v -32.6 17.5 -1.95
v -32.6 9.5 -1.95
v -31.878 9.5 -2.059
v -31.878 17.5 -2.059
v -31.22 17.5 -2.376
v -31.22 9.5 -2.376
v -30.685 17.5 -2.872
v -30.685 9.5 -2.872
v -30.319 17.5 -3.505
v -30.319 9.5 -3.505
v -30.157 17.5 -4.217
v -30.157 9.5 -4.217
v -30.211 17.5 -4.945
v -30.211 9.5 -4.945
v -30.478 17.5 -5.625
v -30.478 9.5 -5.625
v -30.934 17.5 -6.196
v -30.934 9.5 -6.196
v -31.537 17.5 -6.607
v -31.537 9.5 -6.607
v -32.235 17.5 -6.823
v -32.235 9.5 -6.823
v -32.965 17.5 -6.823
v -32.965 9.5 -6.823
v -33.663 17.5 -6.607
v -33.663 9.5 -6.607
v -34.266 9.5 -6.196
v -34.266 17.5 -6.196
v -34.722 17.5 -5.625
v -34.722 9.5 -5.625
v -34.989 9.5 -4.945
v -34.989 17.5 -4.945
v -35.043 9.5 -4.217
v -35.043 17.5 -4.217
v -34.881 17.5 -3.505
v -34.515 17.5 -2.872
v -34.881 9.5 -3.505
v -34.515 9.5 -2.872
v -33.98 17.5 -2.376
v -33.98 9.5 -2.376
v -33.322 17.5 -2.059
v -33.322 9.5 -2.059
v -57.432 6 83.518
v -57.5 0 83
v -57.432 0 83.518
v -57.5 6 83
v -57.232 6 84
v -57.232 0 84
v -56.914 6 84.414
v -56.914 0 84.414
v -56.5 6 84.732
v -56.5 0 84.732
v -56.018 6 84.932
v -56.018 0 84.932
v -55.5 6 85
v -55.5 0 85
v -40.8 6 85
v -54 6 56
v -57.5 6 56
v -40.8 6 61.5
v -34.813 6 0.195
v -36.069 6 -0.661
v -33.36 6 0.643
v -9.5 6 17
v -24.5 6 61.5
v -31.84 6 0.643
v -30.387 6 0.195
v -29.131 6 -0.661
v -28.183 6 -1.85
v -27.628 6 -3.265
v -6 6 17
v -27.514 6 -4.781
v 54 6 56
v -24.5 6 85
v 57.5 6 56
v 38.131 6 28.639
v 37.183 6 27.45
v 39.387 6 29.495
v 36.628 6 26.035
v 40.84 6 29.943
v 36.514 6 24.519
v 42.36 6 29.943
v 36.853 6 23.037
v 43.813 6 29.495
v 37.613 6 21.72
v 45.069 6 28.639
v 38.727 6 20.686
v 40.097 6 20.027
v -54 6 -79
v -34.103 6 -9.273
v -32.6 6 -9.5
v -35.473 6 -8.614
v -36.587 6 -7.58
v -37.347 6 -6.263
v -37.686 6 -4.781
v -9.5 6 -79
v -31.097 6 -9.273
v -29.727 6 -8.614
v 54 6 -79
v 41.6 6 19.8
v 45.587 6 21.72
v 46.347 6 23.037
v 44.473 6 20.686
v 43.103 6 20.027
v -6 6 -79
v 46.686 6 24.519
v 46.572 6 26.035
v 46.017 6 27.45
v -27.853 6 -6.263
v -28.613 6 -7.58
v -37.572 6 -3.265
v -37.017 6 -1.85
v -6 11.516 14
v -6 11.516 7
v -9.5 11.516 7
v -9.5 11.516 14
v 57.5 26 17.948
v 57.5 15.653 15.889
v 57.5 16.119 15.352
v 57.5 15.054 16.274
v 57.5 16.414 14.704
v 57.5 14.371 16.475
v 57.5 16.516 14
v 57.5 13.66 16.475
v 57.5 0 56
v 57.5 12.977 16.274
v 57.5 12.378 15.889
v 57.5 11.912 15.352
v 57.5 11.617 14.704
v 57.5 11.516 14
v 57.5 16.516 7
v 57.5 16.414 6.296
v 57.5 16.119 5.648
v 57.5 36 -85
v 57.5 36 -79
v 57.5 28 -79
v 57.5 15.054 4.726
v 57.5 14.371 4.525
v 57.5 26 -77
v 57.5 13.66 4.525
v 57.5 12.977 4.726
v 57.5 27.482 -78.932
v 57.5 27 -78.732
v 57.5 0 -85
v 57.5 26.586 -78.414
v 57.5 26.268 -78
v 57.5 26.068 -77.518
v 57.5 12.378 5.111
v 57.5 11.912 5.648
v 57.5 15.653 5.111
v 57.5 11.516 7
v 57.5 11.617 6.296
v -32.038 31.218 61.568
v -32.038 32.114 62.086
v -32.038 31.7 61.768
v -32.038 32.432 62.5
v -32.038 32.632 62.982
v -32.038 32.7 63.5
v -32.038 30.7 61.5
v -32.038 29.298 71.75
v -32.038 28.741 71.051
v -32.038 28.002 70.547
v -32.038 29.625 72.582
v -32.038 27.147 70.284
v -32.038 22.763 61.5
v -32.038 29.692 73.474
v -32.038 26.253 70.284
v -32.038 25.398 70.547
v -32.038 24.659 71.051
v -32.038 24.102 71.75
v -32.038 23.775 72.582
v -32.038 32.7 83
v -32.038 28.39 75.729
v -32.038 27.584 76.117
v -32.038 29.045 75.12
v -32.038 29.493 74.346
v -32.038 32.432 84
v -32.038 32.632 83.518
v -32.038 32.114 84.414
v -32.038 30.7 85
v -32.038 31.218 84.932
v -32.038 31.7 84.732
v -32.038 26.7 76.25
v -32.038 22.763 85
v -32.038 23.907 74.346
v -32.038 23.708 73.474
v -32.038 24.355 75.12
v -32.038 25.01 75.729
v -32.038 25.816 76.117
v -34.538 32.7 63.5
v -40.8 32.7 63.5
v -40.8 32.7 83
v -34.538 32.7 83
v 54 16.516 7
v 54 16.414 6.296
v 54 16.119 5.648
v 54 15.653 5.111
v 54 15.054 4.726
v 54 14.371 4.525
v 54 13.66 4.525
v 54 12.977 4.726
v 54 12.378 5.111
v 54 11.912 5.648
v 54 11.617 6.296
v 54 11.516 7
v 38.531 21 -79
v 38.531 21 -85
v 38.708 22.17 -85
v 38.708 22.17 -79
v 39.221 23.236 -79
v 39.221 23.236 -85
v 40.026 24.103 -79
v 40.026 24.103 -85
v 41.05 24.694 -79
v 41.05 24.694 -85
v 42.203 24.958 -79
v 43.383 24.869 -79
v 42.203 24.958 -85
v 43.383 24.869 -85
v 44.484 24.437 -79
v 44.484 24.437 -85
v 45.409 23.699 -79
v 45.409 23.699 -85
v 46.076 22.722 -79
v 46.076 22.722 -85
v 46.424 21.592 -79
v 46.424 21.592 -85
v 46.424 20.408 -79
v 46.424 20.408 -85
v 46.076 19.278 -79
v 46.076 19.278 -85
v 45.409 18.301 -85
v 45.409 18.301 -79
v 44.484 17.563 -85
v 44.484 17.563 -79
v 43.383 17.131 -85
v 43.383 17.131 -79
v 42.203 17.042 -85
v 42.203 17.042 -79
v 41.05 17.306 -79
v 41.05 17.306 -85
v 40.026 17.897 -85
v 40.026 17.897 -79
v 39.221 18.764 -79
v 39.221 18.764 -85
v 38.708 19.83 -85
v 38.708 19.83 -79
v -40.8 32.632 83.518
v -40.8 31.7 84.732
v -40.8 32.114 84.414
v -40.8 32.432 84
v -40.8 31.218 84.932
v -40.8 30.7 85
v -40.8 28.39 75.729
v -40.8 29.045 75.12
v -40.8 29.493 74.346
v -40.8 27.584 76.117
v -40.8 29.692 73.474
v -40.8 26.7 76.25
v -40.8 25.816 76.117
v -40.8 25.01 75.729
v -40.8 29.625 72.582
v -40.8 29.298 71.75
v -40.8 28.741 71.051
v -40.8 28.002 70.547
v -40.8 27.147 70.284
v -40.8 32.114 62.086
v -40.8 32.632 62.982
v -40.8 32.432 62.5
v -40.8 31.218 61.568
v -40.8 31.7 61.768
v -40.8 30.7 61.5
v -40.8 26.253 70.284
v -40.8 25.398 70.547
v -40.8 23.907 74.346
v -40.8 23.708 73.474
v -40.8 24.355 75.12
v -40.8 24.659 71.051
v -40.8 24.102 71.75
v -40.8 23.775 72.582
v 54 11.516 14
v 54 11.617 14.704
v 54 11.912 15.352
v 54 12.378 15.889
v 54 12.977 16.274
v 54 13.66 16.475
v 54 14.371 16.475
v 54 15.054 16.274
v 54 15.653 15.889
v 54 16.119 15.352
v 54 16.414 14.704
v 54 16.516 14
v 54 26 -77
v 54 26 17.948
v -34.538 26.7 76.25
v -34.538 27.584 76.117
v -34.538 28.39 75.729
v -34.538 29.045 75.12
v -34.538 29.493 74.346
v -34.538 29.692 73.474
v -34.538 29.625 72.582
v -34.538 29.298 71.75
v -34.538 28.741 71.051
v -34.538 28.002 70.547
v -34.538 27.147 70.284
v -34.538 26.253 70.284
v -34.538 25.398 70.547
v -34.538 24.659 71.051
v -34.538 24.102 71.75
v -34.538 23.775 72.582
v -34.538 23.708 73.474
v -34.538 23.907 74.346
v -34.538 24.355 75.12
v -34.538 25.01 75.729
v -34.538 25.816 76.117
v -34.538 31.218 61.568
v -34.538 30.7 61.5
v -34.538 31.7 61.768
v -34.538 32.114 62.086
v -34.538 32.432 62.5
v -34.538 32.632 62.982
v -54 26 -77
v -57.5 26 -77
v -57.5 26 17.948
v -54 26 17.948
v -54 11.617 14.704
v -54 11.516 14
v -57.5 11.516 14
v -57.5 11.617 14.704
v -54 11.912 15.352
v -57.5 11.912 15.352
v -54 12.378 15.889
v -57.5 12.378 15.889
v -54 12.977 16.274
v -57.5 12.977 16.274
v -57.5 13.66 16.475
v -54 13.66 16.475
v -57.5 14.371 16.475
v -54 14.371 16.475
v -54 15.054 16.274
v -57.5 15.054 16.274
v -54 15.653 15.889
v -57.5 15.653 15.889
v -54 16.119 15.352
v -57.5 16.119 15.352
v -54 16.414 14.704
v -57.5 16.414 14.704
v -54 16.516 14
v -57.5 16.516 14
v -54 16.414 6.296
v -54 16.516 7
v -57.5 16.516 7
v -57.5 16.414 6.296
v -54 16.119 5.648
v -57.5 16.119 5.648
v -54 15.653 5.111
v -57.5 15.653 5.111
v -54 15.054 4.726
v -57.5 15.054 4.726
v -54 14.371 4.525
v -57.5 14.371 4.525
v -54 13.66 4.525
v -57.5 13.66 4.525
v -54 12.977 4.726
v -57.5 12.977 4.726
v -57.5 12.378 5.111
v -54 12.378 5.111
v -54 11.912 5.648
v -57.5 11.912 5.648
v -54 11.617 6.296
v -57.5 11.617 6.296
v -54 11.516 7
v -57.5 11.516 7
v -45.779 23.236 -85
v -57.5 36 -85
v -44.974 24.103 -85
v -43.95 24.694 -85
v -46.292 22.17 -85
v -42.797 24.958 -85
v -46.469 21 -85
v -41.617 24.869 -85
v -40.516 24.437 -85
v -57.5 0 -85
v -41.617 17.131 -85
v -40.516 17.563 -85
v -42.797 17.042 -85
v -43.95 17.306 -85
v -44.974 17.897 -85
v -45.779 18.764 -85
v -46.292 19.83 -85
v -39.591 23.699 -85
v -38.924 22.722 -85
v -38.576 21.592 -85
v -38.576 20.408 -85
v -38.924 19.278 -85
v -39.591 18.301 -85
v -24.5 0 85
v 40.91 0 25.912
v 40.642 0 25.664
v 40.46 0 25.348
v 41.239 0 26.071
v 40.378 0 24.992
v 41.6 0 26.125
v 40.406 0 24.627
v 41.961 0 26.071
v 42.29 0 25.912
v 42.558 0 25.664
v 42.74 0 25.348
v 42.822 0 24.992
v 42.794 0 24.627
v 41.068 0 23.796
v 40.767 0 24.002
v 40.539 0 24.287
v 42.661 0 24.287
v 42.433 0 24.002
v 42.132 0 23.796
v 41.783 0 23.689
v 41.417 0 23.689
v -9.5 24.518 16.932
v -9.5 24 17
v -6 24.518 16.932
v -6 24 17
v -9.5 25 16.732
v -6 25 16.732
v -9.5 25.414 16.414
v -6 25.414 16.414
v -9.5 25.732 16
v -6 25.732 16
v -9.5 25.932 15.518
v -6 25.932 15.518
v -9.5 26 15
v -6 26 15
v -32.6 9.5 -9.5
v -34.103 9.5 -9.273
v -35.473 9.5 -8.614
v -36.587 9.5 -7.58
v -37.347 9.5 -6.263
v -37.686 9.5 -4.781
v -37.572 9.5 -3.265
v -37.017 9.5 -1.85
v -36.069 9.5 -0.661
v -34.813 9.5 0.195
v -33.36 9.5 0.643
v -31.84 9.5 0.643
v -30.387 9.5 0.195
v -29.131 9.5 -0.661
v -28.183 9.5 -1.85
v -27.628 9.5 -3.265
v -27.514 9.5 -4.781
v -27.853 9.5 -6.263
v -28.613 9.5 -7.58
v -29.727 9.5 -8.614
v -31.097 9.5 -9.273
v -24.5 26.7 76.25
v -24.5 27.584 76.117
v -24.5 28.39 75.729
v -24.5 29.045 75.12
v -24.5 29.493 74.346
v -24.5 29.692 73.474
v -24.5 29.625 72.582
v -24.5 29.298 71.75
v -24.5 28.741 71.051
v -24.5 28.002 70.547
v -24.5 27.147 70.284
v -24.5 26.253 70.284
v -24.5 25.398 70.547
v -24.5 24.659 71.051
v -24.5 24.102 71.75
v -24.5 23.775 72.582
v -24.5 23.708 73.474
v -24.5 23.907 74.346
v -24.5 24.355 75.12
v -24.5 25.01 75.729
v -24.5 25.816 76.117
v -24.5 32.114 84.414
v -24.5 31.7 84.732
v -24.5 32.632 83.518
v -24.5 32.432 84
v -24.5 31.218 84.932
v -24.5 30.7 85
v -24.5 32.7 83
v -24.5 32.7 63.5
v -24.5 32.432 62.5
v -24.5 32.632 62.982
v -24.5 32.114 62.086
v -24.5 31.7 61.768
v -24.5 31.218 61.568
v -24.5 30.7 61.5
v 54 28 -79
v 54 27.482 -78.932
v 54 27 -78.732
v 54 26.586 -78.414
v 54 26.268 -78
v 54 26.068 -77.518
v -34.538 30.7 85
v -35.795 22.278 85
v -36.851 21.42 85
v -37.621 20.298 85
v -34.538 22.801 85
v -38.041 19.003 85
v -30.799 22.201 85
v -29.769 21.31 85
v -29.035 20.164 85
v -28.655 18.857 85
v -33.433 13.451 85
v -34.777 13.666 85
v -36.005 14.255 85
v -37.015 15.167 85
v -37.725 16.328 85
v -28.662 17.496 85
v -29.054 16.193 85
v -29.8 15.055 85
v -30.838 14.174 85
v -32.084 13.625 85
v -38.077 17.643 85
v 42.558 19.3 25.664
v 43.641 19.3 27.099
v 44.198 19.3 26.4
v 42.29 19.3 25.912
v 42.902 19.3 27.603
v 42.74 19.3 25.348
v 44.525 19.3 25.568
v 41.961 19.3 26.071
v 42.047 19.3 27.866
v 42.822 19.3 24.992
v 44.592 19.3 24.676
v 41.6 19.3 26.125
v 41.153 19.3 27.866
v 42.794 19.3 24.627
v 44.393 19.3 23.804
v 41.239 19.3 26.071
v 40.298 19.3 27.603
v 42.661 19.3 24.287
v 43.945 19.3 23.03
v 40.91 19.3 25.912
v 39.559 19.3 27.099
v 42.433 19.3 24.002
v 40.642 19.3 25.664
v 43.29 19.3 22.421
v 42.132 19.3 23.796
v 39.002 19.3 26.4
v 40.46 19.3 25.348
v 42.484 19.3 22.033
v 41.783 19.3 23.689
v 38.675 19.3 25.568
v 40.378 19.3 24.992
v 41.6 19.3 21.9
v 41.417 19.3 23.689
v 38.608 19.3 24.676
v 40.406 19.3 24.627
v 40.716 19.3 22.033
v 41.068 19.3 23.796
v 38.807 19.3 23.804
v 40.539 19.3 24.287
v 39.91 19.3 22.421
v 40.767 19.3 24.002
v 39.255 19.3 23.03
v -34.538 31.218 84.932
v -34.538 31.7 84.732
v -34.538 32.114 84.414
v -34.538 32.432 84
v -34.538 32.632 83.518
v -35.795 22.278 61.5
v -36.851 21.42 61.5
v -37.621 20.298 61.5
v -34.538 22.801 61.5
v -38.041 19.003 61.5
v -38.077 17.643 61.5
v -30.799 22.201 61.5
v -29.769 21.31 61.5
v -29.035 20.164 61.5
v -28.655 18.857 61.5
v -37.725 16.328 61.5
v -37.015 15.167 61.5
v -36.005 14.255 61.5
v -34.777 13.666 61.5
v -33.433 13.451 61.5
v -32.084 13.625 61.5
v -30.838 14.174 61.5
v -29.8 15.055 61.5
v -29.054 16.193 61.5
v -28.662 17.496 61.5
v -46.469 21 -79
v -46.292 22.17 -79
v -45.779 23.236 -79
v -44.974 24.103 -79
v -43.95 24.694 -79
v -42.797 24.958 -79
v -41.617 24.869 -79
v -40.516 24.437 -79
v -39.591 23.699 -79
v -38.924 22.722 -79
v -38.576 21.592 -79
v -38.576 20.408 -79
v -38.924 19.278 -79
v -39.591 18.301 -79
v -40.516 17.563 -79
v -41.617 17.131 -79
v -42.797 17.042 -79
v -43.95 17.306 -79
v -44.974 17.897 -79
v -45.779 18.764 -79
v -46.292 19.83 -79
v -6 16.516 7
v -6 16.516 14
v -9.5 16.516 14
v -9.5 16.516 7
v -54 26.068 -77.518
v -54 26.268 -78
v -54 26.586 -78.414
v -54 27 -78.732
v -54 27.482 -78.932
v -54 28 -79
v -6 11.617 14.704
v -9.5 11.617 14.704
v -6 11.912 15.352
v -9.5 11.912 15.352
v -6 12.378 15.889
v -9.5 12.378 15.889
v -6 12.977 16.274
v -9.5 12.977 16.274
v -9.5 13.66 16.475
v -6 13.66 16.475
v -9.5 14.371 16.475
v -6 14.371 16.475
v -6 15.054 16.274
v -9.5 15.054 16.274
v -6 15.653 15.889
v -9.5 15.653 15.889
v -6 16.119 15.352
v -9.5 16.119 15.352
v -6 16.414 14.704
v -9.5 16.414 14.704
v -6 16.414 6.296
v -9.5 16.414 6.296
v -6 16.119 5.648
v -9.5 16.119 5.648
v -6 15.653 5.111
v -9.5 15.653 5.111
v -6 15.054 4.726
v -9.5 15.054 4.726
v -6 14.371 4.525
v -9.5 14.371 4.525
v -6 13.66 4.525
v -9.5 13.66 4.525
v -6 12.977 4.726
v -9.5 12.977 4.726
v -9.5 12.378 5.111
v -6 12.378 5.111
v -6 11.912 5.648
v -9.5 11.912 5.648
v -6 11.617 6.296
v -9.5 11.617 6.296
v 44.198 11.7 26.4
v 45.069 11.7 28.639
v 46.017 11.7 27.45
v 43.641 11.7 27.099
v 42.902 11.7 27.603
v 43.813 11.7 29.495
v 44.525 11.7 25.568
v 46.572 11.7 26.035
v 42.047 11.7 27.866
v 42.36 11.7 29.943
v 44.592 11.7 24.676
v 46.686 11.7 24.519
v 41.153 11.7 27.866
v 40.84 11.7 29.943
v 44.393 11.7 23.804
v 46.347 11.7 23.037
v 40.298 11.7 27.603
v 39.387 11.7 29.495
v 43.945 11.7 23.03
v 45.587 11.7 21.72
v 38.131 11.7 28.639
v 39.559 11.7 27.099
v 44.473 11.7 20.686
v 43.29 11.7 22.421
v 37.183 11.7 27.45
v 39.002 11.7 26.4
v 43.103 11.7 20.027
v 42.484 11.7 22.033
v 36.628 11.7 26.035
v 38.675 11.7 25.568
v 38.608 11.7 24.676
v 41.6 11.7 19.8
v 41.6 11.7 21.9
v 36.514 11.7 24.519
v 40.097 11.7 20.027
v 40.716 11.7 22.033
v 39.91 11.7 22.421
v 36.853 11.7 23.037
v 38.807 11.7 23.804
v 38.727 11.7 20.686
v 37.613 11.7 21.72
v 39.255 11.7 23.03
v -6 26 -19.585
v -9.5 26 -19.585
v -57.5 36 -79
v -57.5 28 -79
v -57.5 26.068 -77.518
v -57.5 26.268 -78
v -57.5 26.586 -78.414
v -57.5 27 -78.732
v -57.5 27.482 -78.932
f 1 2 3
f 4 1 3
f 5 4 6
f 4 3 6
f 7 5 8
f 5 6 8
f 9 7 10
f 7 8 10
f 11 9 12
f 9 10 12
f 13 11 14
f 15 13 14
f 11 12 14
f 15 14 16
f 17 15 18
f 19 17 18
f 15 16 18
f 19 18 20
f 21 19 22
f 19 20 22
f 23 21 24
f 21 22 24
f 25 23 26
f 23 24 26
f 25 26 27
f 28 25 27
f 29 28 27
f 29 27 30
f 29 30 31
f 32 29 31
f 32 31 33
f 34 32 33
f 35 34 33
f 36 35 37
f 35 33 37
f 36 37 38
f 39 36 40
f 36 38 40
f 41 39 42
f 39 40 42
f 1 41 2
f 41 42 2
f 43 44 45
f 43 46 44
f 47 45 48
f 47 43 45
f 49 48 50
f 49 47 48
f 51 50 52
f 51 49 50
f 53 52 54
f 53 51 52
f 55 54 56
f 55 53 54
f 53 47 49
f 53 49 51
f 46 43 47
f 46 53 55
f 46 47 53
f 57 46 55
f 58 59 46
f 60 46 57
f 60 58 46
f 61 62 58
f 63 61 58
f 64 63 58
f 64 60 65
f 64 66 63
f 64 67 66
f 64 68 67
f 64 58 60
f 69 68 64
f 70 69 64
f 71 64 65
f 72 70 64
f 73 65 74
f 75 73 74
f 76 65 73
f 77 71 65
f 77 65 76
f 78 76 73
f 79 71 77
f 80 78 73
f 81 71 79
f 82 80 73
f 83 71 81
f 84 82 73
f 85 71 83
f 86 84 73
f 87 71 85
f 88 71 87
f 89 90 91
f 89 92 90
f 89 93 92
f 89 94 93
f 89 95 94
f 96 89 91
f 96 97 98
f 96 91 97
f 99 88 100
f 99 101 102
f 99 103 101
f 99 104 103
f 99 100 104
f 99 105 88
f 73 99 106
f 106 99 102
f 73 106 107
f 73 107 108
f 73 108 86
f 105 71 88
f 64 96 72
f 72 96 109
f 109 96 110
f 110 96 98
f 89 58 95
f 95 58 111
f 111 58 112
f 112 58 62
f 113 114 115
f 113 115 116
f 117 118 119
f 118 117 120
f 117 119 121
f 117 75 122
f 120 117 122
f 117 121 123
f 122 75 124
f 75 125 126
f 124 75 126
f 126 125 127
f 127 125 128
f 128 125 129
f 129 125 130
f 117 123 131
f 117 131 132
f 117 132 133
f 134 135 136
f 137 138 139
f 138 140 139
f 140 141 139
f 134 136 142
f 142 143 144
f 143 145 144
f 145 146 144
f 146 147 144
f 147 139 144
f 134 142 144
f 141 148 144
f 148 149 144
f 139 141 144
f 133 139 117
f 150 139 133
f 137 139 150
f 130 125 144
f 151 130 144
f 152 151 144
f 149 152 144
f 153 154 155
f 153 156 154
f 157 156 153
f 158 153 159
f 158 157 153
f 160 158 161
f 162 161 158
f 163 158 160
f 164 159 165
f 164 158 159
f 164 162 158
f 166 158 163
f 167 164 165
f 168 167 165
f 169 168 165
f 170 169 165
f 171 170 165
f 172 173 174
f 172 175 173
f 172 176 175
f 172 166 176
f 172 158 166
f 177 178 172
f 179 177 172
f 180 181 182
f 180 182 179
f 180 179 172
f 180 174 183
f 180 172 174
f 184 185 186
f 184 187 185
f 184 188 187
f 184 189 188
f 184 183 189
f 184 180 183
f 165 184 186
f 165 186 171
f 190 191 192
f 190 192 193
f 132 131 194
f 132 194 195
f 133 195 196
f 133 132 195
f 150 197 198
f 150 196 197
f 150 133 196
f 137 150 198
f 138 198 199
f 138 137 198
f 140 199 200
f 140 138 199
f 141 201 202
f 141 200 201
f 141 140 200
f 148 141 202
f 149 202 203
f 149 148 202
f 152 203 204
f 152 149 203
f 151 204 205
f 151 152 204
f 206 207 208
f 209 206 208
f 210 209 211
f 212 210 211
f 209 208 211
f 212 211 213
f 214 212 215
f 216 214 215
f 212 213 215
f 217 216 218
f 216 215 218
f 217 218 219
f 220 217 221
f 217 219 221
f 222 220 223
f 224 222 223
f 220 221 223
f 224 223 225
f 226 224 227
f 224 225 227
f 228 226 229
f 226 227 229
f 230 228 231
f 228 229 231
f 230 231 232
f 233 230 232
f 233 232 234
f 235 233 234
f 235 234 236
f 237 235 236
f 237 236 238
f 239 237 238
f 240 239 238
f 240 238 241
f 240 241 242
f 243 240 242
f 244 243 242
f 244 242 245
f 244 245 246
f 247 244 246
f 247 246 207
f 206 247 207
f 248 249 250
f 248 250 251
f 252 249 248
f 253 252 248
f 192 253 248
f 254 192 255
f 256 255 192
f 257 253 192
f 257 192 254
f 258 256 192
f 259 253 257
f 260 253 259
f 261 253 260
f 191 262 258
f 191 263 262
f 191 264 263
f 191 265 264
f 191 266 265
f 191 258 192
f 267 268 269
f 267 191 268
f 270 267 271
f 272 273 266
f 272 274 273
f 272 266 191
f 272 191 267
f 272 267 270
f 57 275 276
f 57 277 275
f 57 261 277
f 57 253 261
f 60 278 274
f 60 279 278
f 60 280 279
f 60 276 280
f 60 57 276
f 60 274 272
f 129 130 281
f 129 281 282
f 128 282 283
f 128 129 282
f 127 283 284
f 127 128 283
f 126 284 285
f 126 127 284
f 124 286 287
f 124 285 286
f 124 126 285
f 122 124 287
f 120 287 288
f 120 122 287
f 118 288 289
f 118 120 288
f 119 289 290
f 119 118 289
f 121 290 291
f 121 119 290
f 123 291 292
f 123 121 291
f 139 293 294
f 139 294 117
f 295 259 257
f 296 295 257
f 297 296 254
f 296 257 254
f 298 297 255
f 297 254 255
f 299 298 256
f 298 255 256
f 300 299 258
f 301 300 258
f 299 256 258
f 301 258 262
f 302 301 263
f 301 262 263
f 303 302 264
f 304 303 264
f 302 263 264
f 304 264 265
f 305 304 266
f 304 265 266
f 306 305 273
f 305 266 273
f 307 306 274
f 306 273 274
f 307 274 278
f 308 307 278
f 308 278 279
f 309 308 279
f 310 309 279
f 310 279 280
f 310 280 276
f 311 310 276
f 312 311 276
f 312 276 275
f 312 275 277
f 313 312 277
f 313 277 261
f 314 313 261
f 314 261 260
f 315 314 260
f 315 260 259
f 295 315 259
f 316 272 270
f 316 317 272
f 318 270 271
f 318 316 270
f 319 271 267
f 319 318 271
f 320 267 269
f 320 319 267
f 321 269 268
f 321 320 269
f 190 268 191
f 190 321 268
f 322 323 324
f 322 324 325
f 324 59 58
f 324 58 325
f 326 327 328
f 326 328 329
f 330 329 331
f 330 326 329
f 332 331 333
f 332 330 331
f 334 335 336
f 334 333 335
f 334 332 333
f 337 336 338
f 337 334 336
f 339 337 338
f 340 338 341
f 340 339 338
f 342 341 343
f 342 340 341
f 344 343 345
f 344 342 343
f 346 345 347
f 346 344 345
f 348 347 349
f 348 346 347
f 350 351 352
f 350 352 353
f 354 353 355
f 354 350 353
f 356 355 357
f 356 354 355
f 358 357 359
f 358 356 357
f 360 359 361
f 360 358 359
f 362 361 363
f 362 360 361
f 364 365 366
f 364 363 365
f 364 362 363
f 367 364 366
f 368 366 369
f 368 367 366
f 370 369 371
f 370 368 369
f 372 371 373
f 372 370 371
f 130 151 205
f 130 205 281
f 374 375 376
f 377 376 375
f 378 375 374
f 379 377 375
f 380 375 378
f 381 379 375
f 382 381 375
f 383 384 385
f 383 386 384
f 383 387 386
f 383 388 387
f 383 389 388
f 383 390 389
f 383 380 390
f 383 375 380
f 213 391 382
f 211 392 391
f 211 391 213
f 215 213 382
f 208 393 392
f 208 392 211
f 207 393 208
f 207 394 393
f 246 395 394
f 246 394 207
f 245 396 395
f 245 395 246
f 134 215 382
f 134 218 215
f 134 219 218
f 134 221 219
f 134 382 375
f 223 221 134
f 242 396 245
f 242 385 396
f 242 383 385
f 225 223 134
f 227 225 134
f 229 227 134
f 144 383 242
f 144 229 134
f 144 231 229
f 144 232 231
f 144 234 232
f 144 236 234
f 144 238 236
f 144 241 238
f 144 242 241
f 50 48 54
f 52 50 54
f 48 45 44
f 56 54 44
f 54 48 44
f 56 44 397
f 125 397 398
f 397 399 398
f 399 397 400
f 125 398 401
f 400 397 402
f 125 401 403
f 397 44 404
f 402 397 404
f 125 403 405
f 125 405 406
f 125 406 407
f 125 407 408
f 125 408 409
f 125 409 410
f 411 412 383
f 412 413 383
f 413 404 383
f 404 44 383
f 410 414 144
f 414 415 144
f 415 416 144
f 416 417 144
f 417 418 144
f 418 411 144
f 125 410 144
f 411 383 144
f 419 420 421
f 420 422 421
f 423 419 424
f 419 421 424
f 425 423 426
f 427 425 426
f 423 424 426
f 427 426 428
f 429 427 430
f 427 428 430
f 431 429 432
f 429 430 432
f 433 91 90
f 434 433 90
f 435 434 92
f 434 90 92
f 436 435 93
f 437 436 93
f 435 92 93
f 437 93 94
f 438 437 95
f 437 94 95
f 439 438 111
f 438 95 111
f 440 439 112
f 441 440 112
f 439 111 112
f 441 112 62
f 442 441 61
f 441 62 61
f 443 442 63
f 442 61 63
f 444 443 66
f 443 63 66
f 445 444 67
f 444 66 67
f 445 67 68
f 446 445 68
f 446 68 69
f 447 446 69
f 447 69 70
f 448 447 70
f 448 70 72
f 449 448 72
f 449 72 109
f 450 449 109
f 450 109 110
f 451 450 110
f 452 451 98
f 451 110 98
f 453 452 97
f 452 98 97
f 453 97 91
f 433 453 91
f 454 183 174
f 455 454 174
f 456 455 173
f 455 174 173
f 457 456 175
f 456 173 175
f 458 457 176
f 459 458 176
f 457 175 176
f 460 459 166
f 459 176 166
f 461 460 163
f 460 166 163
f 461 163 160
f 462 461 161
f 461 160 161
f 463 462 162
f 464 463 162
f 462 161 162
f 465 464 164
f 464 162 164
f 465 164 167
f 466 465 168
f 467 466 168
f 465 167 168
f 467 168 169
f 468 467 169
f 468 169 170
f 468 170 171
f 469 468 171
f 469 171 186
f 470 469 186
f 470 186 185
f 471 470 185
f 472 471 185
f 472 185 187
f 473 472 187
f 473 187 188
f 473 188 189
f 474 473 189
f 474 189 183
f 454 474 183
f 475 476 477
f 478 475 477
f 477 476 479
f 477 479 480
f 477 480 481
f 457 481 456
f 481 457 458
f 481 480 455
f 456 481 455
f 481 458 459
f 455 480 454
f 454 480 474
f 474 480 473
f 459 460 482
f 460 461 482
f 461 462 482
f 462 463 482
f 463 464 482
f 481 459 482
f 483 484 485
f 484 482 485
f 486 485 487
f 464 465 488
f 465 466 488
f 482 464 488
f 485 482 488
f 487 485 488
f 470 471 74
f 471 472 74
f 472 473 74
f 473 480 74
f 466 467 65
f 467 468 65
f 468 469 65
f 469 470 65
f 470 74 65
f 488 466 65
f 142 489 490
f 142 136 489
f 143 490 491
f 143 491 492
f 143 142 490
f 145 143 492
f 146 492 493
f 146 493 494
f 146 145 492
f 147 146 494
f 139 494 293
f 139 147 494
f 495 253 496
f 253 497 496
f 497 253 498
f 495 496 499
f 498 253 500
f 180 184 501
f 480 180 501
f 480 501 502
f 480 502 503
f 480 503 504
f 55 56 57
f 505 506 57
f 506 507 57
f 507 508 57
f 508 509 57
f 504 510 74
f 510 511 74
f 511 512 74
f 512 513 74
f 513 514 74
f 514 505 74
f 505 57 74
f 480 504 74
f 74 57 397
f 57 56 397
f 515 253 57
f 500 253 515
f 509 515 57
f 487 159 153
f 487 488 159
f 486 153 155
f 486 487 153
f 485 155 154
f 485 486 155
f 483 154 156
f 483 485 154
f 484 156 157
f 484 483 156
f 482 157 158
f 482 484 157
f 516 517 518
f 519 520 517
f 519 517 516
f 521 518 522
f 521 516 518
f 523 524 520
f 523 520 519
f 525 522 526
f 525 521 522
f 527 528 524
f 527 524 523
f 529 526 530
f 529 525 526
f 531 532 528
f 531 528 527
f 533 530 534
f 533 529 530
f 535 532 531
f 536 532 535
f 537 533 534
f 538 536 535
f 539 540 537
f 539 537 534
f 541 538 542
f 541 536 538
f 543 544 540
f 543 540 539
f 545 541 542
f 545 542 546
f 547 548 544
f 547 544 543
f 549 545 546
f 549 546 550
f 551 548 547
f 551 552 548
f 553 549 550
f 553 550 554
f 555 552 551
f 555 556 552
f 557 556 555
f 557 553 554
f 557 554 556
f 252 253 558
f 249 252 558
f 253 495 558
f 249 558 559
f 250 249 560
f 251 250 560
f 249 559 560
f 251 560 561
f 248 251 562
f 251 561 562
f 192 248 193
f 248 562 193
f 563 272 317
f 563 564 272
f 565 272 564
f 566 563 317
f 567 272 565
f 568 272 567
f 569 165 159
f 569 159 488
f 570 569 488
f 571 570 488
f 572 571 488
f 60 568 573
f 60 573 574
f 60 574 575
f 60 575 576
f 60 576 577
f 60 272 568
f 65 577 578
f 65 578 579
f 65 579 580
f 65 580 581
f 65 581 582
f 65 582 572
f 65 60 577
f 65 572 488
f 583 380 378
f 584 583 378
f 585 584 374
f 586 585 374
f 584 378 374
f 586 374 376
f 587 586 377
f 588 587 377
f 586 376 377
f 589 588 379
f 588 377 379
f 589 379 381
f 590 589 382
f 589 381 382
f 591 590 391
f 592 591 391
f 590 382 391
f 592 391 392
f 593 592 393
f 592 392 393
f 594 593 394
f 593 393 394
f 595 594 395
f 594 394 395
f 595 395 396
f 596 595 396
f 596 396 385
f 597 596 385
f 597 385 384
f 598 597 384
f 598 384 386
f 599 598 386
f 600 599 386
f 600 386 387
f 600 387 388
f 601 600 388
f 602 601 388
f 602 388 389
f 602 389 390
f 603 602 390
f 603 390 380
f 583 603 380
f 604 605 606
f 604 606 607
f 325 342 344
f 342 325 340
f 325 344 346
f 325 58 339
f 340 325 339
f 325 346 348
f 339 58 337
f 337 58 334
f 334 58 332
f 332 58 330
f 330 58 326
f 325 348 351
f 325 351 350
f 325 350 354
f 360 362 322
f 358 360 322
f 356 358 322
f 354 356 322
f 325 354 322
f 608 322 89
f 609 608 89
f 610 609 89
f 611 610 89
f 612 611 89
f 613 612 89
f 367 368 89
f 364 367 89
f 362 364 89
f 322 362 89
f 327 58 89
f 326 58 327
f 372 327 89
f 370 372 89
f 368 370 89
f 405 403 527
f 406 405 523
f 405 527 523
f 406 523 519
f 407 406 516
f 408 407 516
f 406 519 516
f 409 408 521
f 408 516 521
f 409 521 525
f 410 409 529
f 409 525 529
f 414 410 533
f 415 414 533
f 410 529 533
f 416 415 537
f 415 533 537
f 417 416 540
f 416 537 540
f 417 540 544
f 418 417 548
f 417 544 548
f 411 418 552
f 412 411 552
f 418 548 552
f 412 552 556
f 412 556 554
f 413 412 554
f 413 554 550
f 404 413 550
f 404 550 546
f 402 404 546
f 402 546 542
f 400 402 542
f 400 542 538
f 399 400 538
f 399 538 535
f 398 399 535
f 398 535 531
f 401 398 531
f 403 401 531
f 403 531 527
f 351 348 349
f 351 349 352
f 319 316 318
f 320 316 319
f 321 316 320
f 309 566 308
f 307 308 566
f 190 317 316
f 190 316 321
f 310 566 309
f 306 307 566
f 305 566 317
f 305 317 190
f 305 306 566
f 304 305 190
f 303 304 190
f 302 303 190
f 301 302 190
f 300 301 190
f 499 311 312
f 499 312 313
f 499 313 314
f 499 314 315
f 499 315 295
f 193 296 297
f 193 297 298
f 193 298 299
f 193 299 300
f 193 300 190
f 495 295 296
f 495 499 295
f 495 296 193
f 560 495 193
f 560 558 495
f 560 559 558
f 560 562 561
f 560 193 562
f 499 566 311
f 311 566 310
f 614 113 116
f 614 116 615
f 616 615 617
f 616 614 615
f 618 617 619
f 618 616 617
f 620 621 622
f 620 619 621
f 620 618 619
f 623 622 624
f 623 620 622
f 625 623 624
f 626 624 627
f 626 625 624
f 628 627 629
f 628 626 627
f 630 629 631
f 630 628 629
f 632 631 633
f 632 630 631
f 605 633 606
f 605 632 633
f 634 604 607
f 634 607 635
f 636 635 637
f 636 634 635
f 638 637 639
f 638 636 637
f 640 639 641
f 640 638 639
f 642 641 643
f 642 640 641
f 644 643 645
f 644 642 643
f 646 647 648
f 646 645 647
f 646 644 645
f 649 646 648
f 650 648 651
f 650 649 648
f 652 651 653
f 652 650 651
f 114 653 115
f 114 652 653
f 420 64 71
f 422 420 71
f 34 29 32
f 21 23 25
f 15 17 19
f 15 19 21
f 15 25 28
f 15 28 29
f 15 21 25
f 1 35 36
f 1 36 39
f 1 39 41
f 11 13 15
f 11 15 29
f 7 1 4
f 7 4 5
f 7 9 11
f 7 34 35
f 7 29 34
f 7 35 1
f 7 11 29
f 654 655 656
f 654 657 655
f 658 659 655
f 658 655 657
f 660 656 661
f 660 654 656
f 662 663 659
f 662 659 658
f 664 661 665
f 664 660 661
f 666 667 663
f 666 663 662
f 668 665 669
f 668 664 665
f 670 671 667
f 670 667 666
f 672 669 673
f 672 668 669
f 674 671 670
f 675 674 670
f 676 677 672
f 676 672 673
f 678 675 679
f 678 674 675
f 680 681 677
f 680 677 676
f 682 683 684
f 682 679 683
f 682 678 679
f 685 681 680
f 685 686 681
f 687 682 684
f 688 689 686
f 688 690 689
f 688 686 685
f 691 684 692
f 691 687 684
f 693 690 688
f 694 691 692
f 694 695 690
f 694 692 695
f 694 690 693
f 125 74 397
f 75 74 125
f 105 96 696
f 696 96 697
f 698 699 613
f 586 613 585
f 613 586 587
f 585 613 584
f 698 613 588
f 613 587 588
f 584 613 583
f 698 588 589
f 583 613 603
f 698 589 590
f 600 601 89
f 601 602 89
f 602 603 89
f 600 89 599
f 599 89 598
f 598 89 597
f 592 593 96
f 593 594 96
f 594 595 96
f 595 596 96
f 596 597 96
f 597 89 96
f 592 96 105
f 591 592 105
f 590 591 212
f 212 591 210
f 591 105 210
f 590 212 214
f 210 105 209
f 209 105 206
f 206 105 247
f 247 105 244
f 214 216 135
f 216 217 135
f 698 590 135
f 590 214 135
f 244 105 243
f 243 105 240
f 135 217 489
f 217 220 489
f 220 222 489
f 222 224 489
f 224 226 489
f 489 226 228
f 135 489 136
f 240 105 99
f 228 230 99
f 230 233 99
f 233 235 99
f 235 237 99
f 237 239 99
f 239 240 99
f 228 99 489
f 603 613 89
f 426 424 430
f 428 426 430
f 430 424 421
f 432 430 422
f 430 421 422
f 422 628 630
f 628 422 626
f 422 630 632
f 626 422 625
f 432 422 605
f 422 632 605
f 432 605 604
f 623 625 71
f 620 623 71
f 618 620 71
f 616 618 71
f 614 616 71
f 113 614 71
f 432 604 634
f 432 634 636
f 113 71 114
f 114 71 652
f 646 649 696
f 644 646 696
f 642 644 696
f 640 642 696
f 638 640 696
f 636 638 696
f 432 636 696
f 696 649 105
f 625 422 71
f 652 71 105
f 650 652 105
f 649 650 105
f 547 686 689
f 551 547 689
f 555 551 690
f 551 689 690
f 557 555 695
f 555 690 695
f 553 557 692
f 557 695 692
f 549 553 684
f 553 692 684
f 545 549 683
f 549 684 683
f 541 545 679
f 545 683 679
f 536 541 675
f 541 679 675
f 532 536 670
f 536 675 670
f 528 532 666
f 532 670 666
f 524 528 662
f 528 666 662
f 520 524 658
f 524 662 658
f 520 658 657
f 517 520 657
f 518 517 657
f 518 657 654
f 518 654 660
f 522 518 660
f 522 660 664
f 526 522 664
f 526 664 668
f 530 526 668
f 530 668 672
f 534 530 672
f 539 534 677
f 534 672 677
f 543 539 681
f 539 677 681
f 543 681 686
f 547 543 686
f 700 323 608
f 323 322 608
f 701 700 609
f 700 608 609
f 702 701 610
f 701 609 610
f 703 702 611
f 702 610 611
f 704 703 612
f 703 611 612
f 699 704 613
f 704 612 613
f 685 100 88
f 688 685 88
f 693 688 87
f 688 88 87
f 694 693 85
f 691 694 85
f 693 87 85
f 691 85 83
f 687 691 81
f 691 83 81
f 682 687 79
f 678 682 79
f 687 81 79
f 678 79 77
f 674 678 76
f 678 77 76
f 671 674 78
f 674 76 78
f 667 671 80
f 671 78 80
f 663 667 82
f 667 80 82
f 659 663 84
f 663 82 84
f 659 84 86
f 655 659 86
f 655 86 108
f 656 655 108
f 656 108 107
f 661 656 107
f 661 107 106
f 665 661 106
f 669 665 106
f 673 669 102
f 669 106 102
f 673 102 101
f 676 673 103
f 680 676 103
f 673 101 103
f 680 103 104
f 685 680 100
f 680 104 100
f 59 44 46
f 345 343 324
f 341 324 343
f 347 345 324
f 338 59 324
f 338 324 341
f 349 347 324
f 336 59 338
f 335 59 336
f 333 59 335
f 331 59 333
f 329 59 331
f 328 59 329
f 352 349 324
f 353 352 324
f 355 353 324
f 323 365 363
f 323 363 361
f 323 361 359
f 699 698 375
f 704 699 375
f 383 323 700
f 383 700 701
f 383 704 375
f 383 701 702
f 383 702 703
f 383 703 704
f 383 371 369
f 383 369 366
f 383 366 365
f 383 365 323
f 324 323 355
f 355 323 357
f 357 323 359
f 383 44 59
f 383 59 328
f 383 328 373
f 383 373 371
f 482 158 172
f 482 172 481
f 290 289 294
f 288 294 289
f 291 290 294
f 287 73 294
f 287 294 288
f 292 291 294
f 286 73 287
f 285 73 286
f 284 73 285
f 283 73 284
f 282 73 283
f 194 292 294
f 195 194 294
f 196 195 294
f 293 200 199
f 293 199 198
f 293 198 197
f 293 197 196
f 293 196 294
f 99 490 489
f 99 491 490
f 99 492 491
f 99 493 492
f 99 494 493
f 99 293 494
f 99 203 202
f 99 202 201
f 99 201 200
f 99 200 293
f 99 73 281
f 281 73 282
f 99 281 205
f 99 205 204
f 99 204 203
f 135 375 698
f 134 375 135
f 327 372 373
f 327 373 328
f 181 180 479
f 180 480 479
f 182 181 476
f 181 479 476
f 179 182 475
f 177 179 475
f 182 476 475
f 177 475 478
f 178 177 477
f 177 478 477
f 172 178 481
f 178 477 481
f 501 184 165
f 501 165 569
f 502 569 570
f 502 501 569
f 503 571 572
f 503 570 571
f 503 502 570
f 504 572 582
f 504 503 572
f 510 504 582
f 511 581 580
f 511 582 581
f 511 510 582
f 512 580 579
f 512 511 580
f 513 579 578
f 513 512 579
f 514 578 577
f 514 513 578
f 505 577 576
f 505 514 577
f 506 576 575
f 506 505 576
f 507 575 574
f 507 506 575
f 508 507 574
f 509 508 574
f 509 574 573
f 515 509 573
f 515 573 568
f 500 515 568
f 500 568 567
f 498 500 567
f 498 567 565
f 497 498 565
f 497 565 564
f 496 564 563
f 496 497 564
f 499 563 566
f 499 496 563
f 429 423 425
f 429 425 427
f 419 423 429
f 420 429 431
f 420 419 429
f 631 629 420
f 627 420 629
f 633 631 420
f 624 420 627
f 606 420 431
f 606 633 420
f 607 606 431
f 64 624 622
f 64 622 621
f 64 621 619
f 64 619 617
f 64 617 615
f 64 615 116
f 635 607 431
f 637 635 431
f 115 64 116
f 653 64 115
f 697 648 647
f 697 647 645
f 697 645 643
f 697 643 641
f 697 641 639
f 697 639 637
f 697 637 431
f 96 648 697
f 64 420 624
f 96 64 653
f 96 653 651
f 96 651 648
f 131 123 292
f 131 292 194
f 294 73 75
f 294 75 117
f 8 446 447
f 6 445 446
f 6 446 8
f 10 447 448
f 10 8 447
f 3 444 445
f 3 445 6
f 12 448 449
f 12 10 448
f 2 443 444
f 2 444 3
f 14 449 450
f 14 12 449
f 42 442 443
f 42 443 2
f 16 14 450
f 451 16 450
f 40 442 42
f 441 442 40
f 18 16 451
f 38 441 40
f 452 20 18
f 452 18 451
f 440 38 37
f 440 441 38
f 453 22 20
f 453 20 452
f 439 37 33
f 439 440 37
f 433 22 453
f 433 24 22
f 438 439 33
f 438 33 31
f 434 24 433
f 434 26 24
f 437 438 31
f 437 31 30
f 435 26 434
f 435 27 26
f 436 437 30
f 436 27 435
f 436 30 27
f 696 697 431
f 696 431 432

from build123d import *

# Parameters (mm, degrees)
SKETCH1_W                               = 115
SKETCH1_H                               = 170
BACK_WALL_EXTRUDE_DEPTH                 = 6
SKETCH2_W                               = 115
SKETCH2_H                               = 6
BOTTOM_PLATE_EXTRUDE_DEPTH              = 30
SKETCH3_W                               = 3.5
SKETCH3_H                               = 135
SKETCH3_H_2                             = 96
SIDE_WALLS_EXTRUDE_DEPTH                = 20
SKETCH4_W                               = 16.3
SKETCH4_H                               = 23.5
DIAL_INDIACTOR_HOLDER_EXTRUDE_DEPTH     = 26.7
DIAL_INDICATOR_HOLE_CUT_DEPTH           = 26.7
SKETCH6_R                               = 3
DIAL_INDICATOR_TIGHTENER_HOLE_CUT_DEPTH = 26.7
SKETCH7_R                               = 5.1
ARM_BASE_EXTRUDE_DEPTH                  = 5.7
SKETCH8_R                               = 3
ARM_AXLE_EXTRUDE_DEPTH                  = 7.6
SKETCH9_R                               = 5.1
GUIDE_WHEEL_BASE_EXTRUDE_DEPTH          = 3.5
SKETCH10_R                              = 2.45
GUIDE_WHEEL_AXLE_EXTRUDE_DEPTH          = 8
FILAMENT_START                          = 71.967294703
FILAMENT_SLOT_CUT_OUTLINE_W             = 100
FILAMENT_SLOT_CUT_OUTLINE_H             = 6
FILAMENT_SLOT_CUT_DEPTH                 = 27.34055864
FILAMENT_START_2                        = -115
FILAMENT_SLOT_CUT_2_DEPTH               = 116
SKETCH13_R                              = 3.96875
MOUNTING_HOLES_CUT_DEPTH                = 8
FILLET1_R                               = 2
CUT_EXTRUDE9_DEPTH                      = 8
SKETCH15_R                              = 1.225
SCREW_HOLE_CUT_DEPTH                    = 105.420974904
CUT_EXTRUDE11_DEPTH                     = 148.465250144


with BuildPart() as part:
    # Sketch1 → Back Wall Extrude (new body)
    with BuildSketch(Plane(origin=(0, 0, 0), x_dir=(1, 0, 0), z_dir=(0, 1, 0))):
        Rectangle(SKETCH1_W, SKETCH1_H)
    extrude(amount=BACK_WALL_EXTRUDE_DEPTH)

    # Sketch2 → Bottom Plate Extrude (add)
    with BuildSketch(Plane(origin=(0, 6, 0), x_dir=(1, 0, 0), z_dir=(0, 1, 0))):
        with Locations((0, 82)):
            Rectangle(SKETCH2_W, SKETCH2_H)
    extrude(amount=BOTTOM_PLATE_EXTRUDE_DEPTH)

    # Sketch3 → Side Walls Extrude (add)
    with BuildSketch(Plane(origin=(0, 6, 0), x_dir=(1, 0, 0), z_dir=(0, 1, 0))):
        with Locations((-55.75, 11.5)):
            Rectangle(SKETCH3_W, SKETCH3_H)
        with Locations((55.75, 11.5)):
            Rectangle(SKETCH3_W, SKETCH3_H)
        with Locations((-7.75, 31)):
            Rectangle(SKETCH3_W, SKETCH3_H_2)
    extrude(amount=SIDE_WALLS_EXTRUDE_DEPTH)

    # Sketch4 → Dial Indiactor Holder Extrude (add)
    with BuildSketch(Plane(origin=(0, 6, 0), x_dir=(1, 0, 0), z_dir=(0, 1, 0))):
        with Locations((-32.65, -73.25)):
            Rectangle(SKETCH4_W, SKETCH4_H)
    extrude(amount=DIAL_INDIACTOR_HOLDER_EXTRUDE_DEPTH)

    # Sketch5 → Dial Indicator Hole Cut (cut)
    with BuildSketch(Plane.XY.offset(85)):
        with BuildLine():
            Line((-34.538403692, 32.7), (-32.038403692, 32.7))
            Line((-32.038403692, 32.7), (-32.038403692, 22.762553146))
            ThreePointArc((-32.038403692, 22.762553146), (-33.433435972, 13.450573614), (-34.538403692, 22.801409096))
            Line((-34.538403692, 22.801409096), (-34.538403692, 32.7))
        make_face()
    extrude(amount=-DIAL_INDICATOR_HOLE_CUT_DEPTH, mode=Mode.SUBTRACT)

    # Sketch6 → Dial Indicator Tightener Hole Cut (cut)
    with BuildSketch(Plane.ZY.offset(40.8)):
        with Locations((73.25, 26.7)):
            Circle(SKETCH6_R)
    extrude(amount=-DIAL_INDICATOR_TIGHTENER_HOLE_CUT_DEPTH, mode=Mode.SUBTRACT)

    # Sketch7 → Arm Base Extrude (add)
    with BuildSketch(Plane(origin=(0, 6, 0), x_dir=(1, 0, 0), z_dir=(0, 1, 0))):
        with Locations(Location((41.6, -24.9, 0), (0, 0, 90))):
            Circle(SKETCH7_R)
    extrude(amount=ARM_BASE_EXTRUDE_DEPTH)

    # Sketch8 → Arm Axle Extrude (add)
    with BuildSketch(Plane(origin=(0, 11.7, 0), x_dir=(1, 0, 0), z_dir=(0, 1, 0))):
        with Locations(Location((41.6, -24.9, 0), (0, 0, 90))):
            Circle(SKETCH8_R)
    extrude(amount=ARM_AXLE_EXTRUDE_DEPTH)

    # Sketch9 → Guide Wheel Base Extrude (add)
    with BuildSketch(Plane(origin=(0, 6, 0), x_dir=(1, 0, 0), z_dir=(0, 1, 0))):
        with Locations(Location((-32.6, 4.4, 0), (0, 0, 90))):
            Circle(SKETCH9_R)
    extrude(amount=GUIDE_WHEEL_BASE_EXTRUDE_DEPTH)

    # Sketch10 → Guide Wheel Axle Extrude (add)
    with BuildSketch(Plane(origin=(0, 9.5, 0), x_dir=(1, 0, 0), z_dir=(0, 1, 0))):
        with Locations(Location((-32.6, 4.4, 0), (0, 0, 270))):
            Circle(SKETCH10_R)
    extrude(amount=GUIDE_WHEEL_AXLE_EXTRUDE_DEPTH)

    # Filament Slot Cut: read off the stored shape, not the designer's step
    # Filament Slot Cut outline → Filament Slot Cut (cut)
    with BuildSketch(Plane(origin=(0, 0, 0), x_dir=(0.942777884125997, 0, -0.333421446825048), z_dir=(0.333421446825048, 0, 0.942777884125997)).offset(FILAMENT_START)):
        with Locations((-3, 3)):
            Rectangle(FILAMENT_SLOT_CUT_OUTLINE_W, FILAMENT_SLOT_CUT_OUTLINE_H)
    extrude(amount=FILAMENT_SLOT_CUT_DEPTH, mode=Mode.SUBTRACT)

    # Filament Slot Cut 2 outline → Filament Slot Cut 2 (cut)
    with BuildSketch(Plane.ZY.offset(57.5).offset(FILAMENT_START_2)):
        with BuildLine():
            ThreePointArc((14, 11.51558642), (16.5, 14.01558642), (14, 16.51558642))
            Line((14, 16.51558642), (7, 16.51558642))
            ThreePointArc((7, 16.51558642), (4.5, 14.01558642), (7, 11.51558642))
            Line((7, 11.51558642), (14, 11.51558642))
        make_face()
    extrude(amount=FILAMENT_SLOT_CUT_2_DEPTH, mode=Mode.SUBTRACT)

    # Sketch13 → Mounting Holes Cut (cut)
    with BuildSketch(Plane(origin=(0, 0, -85), x_dir=(-1, 0, 0), z_dir=(0, 0, -1))):
        with Locations((42.5, 21)):
            Circle(SKETCH13_R)
        with Locations((-42.5, 21)):
            Circle(SKETCH13_R)
    extrude(amount=-MOUNTING_HOLES_CUT_DEPTH, mode=Mode.SUBTRACT)

    # Fillet1
    fillet1_edges = [part.edges().sort_by_distance(p)[0] for p in [
        (-55.75, 26, 56),
        (-55.75, 26, -79),
        (55.75, 26, -79),
        (55.75, 26, 56),
        (-7.75, 26, 17),
        (-37.669201846, 32.7, 85),
        (-28.269201846, 32.7, 61.5),
        (-57.5, 3, 85),
        (-28.269201846, 32.7, 85),
        (-37.669201846, 32.7, 61.5),
    ]]
    fillet(fillet1_edges, radius=FILLET1_R)

    # Sketch14 → Cut-Extrude9 (cut)
    with BuildSketch(Plane.ZY.offset(9.5)):
        Polygon((-79, 6), (-19.585405324, 26), (-79, 26), align=None)
    extrude(amount=-CUT_EXTRUDE9_DEPTH, mode=Mode.SUBTRACT)

    # Sketch15 → Screw Hole Cut (cut, through all)
    with BuildSketch(Plane(origin=(0, 19.3, 0), x_dir=(1, 0, 0), z_dir=(0, 1, 0))):
        with Locations(Location((41.6, -24.9, 0), (0, 0, 270))):
            Circle(SKETCH15_R)
    extrude(amount=-SCREW_HOLE_CUT_DEPTH, mode=Mode.SUBTRACT)

    # Sketch16 → Cut-Extrude11 (cut, through all)
    with BuildSketch(Plane.ZY.offset(57.5)):
        Polygon((56, 6), (17.948284572, 26), (56, 26), align=None)
    extrude(amount=-CUT_EXTRUDE11_DEPTH, mode=Mode.SUBTRACT)


solid = part.part
